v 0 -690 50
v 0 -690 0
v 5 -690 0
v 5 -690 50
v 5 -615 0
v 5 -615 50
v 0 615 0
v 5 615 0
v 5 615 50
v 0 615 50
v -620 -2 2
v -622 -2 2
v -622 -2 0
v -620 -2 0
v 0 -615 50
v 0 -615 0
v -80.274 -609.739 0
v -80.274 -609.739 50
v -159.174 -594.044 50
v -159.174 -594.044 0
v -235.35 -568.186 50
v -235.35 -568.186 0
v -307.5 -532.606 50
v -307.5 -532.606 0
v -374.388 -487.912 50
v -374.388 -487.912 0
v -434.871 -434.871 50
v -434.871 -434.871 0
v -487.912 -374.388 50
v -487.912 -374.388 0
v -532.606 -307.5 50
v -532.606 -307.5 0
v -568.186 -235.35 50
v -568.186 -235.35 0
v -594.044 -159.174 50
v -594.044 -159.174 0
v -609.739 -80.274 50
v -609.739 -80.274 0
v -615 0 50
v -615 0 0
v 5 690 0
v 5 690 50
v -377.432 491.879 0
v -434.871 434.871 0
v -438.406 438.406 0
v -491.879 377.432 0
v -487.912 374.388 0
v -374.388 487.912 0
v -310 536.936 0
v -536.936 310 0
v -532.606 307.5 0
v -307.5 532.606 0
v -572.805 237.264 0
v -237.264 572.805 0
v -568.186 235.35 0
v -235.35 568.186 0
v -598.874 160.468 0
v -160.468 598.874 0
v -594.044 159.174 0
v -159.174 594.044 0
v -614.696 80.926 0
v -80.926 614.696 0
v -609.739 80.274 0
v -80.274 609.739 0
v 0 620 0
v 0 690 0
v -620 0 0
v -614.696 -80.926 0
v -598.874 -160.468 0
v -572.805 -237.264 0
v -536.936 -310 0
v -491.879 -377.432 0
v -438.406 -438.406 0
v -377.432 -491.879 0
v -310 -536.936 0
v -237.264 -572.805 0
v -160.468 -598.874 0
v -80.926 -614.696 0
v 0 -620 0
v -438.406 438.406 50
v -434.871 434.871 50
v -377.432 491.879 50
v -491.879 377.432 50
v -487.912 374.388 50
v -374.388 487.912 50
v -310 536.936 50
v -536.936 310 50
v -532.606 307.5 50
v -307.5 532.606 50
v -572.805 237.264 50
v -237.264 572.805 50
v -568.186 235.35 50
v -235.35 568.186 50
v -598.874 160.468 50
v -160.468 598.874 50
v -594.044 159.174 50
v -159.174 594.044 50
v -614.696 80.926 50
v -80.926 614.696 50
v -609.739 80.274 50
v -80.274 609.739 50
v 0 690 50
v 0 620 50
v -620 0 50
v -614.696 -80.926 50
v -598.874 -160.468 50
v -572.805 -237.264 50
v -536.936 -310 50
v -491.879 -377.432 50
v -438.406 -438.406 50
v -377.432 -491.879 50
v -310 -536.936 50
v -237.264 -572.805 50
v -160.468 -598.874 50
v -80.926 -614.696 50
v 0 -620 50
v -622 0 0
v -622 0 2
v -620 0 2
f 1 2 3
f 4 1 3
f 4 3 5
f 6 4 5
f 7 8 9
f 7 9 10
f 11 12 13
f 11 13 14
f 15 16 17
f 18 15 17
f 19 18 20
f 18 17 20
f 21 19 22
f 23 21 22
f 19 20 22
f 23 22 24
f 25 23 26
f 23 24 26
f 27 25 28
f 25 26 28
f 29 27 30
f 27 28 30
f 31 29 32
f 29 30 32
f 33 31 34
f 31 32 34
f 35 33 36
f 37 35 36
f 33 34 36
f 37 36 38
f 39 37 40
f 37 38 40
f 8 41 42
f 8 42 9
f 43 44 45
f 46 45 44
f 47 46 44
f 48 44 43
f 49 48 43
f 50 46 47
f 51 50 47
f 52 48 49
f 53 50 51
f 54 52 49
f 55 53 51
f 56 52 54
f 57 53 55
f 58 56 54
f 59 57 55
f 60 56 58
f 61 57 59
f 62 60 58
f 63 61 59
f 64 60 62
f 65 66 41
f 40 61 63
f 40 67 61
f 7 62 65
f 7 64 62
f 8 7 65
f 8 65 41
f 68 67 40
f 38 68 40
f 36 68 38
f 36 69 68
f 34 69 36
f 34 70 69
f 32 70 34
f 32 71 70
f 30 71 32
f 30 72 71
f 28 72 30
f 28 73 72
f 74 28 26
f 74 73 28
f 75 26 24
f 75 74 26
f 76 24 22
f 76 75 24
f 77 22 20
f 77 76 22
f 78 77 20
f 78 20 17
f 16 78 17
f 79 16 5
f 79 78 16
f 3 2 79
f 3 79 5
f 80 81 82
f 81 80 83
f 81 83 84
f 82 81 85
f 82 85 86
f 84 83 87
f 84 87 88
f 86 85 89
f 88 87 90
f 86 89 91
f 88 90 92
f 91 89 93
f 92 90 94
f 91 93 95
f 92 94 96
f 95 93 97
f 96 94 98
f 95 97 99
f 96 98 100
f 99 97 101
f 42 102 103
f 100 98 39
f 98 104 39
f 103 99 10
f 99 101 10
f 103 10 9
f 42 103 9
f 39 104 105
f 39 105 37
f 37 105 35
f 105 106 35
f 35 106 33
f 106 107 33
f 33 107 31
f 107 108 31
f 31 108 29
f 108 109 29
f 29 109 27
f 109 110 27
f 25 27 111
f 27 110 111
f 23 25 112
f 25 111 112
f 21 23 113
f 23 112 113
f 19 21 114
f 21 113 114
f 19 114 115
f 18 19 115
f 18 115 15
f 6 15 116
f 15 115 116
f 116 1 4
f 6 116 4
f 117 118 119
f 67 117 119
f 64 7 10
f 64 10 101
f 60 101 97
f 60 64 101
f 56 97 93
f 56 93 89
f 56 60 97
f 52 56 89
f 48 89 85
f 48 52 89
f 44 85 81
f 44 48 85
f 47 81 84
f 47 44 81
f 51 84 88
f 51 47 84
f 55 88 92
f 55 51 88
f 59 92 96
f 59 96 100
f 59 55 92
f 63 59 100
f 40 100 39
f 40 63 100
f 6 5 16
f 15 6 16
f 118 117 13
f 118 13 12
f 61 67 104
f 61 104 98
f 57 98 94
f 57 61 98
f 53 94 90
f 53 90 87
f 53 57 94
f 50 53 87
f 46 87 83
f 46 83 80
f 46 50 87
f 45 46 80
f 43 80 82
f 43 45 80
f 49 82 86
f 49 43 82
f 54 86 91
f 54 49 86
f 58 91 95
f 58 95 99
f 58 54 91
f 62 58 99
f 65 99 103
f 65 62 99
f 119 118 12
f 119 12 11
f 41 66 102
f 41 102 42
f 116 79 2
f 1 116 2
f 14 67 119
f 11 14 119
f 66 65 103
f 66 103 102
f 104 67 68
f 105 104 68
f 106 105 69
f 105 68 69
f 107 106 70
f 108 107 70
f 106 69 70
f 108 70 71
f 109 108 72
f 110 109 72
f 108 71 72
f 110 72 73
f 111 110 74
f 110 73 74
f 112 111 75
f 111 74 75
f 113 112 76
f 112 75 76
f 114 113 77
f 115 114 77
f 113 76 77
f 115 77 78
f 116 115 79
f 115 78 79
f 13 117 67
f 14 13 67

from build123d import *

# Parameters (mm, degrees)
F1_DEPTH = 50
F3_W     = 2
F3_H     = 2
F4_DEPTH = 2


with BuildPart() as f1:
    # F0 (on Top) → F1 (new body)
    with BuildSketch(Plane.XY):
        with BuildLine():
            Line((-615, 0), (-620, 0))
            ThreePointArc((-620, 0), (-438.406204, -438.406204), (0, -620))
            Line((0, -620), (0, -615))
            ThreePointArc((0, -615), (-434.87067, -434.87067), (-615, 0))
        make_face()
        Polygon((0, -615), (0, -620), (0, -690), (5, -690), (5, -615), align=None)
    extrude(amount=F1_DEPTH)

    # F2: F1 across face


with BuildPart() as f1_1:
    add(f1.part)
    add(f1.part.mirror(Plane(origin=(-617.5, 0, 25), x_dir=(-1, 0, 0), z_dir=(0, 1, 0))))


with BuildPart() as f4:
    # F3 (on Front) → F4 (new body)
    with BuildSketch(Plane.XZ):
        with Locations((-621, 1)):
            Rectangle(F3_W, F3_H)
    extrude(amount=F4_DEPTH)


solid = Compound([f1_1.part, f4.part])
